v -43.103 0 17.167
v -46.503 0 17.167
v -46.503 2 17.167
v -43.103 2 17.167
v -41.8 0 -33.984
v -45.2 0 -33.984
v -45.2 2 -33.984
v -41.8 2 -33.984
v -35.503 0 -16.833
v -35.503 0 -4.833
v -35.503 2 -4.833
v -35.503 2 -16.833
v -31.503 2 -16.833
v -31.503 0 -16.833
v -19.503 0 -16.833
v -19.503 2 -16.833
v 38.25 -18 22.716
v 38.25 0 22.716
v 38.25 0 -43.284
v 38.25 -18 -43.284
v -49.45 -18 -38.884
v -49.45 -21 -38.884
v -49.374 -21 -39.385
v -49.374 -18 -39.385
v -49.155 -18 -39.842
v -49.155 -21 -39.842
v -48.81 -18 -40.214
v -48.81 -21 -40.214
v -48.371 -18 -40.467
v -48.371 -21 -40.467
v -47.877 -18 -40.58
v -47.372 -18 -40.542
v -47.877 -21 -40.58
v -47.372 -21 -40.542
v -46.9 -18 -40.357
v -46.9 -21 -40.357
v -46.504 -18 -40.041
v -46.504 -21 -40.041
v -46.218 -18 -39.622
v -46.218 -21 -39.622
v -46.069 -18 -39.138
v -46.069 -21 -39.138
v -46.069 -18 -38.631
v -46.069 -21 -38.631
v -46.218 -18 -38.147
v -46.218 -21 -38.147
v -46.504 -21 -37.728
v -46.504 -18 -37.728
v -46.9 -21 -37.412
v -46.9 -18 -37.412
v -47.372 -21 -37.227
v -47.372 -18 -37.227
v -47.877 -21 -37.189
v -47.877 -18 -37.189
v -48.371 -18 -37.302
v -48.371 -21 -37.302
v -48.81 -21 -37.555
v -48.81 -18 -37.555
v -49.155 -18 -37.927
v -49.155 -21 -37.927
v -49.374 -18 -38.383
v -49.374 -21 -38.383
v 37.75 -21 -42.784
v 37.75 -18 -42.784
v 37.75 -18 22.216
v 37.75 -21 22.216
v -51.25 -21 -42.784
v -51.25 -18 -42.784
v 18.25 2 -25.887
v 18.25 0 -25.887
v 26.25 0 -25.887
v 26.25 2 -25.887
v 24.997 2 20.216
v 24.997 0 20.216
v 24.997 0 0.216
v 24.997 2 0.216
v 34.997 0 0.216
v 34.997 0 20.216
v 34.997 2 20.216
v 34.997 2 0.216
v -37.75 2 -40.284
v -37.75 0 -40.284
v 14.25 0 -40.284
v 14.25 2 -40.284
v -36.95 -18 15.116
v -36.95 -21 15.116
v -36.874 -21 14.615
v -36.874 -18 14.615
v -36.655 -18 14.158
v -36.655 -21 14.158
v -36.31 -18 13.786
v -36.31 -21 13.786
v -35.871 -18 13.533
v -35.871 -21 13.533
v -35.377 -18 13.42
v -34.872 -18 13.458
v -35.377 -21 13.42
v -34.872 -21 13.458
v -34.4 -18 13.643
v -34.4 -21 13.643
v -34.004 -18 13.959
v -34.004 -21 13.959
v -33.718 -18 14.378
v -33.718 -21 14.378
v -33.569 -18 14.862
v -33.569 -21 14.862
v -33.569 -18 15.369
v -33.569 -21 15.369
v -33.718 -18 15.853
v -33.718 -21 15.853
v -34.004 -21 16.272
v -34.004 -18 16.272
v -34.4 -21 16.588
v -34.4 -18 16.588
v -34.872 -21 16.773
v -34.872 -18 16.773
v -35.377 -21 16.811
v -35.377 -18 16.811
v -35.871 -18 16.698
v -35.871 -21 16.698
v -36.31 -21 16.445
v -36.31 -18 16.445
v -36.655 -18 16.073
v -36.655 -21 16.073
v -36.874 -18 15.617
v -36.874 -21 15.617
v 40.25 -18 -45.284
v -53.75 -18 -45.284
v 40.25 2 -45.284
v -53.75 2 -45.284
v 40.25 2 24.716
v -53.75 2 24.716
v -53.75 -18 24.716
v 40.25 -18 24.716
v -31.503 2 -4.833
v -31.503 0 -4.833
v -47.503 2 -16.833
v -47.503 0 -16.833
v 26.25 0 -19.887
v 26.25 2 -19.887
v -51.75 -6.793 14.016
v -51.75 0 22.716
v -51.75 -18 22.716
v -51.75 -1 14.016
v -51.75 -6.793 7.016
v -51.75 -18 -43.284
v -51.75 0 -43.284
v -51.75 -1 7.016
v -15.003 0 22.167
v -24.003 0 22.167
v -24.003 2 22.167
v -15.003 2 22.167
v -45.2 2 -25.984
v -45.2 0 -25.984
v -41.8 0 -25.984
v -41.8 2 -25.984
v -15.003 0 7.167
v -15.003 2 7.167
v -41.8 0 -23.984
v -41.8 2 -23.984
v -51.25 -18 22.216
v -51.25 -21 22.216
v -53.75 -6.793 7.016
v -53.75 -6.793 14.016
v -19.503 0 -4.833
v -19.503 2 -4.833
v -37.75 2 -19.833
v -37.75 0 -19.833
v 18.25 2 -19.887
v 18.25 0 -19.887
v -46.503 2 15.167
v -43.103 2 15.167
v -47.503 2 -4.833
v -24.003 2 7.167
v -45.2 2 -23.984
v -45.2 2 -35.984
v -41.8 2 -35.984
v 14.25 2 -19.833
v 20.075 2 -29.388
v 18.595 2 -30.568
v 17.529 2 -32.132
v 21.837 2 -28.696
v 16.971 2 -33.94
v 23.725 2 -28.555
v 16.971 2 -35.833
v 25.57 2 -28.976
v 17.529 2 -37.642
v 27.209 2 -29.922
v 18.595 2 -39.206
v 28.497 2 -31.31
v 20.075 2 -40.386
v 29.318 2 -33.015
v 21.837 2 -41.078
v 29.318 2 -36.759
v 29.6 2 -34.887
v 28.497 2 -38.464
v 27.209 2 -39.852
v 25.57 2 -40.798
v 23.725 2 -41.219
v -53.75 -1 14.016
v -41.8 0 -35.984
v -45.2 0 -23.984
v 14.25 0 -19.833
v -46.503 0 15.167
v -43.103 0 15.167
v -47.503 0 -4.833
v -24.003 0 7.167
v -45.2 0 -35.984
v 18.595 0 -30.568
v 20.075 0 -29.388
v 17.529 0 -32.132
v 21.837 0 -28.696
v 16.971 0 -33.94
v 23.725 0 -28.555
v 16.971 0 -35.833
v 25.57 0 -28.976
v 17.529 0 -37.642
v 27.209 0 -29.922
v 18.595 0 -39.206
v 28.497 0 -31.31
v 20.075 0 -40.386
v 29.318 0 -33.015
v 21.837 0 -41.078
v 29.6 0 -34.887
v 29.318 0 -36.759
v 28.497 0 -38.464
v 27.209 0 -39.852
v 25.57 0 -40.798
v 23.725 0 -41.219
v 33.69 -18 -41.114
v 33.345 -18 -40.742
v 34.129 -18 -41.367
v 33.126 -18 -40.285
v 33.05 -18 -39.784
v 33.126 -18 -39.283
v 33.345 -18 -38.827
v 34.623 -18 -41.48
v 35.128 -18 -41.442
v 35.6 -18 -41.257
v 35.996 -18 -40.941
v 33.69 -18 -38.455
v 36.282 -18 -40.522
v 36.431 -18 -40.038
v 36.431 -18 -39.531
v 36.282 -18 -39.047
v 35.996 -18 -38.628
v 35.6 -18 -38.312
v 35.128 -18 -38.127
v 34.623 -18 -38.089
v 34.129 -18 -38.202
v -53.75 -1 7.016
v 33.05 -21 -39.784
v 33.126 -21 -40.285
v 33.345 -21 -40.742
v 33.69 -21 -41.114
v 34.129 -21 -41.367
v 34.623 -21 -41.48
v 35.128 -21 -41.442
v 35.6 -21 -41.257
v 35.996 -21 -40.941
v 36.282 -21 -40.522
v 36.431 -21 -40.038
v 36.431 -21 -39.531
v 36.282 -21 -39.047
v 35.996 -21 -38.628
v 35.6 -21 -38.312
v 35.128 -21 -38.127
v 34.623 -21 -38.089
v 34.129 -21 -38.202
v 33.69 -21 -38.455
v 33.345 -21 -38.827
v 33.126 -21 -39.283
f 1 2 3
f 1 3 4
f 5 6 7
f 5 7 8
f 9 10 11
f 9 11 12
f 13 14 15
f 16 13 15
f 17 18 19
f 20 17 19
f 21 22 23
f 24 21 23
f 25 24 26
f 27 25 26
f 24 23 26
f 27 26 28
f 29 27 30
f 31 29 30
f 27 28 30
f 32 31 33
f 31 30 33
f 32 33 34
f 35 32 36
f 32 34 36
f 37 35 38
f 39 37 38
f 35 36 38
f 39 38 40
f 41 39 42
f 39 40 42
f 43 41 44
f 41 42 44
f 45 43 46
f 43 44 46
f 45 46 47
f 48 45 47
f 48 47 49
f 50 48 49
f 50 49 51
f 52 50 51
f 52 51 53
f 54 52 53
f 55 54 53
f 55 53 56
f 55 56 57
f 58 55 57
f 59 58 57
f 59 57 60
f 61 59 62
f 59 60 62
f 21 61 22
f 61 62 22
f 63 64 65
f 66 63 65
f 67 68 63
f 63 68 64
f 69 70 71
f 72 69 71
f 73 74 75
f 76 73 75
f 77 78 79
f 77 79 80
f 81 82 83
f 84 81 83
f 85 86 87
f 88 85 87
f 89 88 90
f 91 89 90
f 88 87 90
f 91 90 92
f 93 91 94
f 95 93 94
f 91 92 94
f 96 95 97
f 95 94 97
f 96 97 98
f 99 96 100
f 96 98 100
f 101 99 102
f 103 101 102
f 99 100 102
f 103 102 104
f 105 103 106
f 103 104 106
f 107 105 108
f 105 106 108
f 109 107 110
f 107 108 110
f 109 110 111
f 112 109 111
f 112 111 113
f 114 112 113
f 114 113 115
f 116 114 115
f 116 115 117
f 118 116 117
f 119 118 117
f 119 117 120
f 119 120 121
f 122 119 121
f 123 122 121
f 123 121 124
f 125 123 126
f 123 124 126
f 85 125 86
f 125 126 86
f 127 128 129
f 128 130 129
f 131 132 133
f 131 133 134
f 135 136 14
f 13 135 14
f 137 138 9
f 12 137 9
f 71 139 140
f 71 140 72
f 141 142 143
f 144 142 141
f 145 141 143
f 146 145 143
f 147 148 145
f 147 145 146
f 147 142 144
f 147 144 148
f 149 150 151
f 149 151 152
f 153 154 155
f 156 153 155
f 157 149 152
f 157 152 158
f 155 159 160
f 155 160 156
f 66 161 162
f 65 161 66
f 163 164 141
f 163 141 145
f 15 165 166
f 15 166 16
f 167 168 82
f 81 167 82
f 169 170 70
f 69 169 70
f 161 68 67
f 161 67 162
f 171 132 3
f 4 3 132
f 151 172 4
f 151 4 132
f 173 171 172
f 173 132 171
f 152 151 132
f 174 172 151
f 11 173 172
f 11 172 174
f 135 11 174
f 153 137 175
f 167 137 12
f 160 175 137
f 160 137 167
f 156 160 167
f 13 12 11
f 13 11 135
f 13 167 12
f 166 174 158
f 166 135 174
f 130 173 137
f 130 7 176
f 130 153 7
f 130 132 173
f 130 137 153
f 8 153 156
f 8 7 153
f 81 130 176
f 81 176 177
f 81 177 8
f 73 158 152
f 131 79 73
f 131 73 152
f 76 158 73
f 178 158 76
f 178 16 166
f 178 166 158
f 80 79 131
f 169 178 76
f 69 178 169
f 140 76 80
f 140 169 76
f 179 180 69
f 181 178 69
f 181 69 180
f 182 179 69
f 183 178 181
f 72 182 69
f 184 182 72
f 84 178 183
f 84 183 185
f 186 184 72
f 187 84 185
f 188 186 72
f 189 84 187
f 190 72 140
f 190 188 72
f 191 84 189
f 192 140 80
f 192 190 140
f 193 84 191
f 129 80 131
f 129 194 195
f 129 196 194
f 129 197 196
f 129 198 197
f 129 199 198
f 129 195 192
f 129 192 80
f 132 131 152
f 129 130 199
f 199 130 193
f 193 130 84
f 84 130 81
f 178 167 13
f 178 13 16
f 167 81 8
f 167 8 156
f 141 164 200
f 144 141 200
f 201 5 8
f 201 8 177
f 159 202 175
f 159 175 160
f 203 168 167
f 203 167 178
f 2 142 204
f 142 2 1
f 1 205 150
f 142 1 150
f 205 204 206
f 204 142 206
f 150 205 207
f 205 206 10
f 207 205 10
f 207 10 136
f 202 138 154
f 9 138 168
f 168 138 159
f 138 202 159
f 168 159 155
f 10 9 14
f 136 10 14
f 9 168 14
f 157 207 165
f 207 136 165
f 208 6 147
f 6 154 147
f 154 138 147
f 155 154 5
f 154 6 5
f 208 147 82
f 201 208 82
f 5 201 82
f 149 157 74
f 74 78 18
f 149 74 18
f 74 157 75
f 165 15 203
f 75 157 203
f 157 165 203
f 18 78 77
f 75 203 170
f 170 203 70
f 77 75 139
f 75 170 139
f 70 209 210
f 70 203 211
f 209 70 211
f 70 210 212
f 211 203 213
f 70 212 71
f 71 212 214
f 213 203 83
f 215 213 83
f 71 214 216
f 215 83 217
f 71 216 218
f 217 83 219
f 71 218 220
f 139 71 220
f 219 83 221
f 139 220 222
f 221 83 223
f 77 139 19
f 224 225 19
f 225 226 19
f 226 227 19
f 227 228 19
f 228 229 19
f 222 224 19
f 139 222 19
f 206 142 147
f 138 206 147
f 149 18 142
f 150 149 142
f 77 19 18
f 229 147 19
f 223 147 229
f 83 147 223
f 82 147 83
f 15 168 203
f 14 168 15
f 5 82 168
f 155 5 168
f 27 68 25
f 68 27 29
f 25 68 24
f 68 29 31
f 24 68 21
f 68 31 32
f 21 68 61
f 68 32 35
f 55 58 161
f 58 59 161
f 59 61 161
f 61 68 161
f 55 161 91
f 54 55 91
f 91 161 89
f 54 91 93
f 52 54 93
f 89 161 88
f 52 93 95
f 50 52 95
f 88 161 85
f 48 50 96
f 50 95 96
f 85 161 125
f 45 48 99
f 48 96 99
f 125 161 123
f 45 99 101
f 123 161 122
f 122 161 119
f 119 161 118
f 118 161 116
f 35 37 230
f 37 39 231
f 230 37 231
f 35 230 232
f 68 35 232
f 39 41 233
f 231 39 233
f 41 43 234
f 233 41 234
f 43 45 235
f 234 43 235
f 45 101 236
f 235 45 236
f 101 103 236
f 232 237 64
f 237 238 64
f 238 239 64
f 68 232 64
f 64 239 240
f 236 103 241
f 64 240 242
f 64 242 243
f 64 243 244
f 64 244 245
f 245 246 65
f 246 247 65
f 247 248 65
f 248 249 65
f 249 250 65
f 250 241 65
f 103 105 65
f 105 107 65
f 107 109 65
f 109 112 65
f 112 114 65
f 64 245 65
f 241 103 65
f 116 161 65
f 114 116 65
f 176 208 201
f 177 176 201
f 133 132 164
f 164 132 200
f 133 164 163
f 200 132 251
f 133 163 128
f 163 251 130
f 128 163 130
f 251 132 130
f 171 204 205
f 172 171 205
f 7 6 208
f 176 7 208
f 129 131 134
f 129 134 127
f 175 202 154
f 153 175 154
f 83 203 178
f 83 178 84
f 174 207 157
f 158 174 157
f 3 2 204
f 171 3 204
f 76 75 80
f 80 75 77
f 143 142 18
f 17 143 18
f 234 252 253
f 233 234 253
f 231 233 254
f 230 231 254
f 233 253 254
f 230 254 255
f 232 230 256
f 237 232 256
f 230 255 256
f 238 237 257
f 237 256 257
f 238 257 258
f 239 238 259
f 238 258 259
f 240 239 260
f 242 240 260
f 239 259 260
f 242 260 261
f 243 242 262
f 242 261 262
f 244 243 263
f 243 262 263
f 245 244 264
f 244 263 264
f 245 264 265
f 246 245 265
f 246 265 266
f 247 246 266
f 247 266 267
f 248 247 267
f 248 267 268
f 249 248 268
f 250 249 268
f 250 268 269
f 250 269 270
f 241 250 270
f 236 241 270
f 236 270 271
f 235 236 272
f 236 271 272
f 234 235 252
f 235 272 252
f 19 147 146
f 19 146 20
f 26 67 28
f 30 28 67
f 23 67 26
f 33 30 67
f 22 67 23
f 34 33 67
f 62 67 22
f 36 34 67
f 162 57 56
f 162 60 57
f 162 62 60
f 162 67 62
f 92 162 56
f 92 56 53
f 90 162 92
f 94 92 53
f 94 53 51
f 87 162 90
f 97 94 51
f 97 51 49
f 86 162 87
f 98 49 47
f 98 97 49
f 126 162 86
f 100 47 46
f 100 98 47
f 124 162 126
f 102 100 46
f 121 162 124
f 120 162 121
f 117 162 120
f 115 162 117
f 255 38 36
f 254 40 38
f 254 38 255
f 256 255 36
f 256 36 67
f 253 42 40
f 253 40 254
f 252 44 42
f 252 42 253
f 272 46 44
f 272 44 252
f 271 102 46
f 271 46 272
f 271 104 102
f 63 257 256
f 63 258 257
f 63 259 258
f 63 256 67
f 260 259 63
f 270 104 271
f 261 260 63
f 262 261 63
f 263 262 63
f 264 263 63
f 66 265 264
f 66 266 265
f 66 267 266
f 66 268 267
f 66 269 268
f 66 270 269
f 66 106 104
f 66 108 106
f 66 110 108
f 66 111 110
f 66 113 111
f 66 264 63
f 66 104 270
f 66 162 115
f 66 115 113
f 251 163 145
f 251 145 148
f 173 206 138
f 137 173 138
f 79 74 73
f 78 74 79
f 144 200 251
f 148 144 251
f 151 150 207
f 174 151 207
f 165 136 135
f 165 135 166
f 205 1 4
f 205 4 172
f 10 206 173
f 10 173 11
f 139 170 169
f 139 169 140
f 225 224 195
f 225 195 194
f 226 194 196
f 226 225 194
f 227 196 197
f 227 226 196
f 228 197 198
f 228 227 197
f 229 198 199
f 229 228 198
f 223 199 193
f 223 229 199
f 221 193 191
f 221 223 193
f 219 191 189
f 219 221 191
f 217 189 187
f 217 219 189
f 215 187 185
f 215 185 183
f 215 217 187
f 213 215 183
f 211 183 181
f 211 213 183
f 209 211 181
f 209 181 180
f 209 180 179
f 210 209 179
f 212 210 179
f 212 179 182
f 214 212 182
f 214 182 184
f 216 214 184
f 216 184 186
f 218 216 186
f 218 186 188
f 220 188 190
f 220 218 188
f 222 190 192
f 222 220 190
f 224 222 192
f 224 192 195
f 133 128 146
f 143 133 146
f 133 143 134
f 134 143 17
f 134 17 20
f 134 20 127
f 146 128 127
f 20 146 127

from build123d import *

# Parameters (mm, degrees)
SKETCH1_W                = 94
SKETCH1_H                = 70
SKETCH1_R                = 6.35
SKETCH1_W_2              = 8
SKETCH1_H_2              = 6
SKETCH1_W_3              = 3.4
SKETCH1_H_3              = 2
SKETCH1_W_4              = 52
SKETCH1_H_4              = 20.451642238
SKETCH1_W_5              = 12
SKETCH1_H_5              = 12
SKETCH1_W_6              = 9
SKETCH1_H_6              = 15
SKETCH1_W_7              = 10
SKETCH1_H_7              = 20
BOSS_EXTRUDE1_DEPTH      = 2
SKETCH2_W                = 94
SKETCH2_H                = 70
SKETCH2_W_2              = 90
SKETCH2_H_2              = 66
BOSS_EXTRUDE2_DEPTH      = 1
BOSS_EXTRUDE2_DEPTH_BACK = 18
CUT_EXTRUDE1_START       = -94
SKETCH3_W                = 7
SKETCH3_H                = 5.793277682
CUT_EXTRUDE1_DEPTH       = 10
CUT_EXTRUDE1_DEPTH_BACK  = 10
SKETCH4_W                = 89
SKETCH4_H                = 65
BOSS_EXTRUDE3_DEPTH      = 3
SKETCH5_R                = 1.7
CUT_EXTRUDE5_DEPTH       = 3


with BuildPart() as part:
    # Sketch1 → Boss-Extrude1 (new body)
    with BuildSketch(Plane(origin=(0, 0, 0), x_dir=(1, 0, 0), z_dir=(0, 1, 0))):
        with Locations((-6.75, 10.284411869)):
            Rectangle(SKETCH1_W, SKETCH1_H)
        with Locations((23.25, 34.886908177)):
            Circle(SKETCH1_R, mode=Mode.SUBTRACT)
        with Locations((22.25, 22.886908177)):
            Rectangle(SKETCH1_W_2, SKETCH1_H_2, mode=Mode.SUBTRACT)
        with Locations((-43.5, 24.984411869)):
            Rectangle(SKETCH1_W_3, SKETCH1_H_3, mode=Mode.SUBTRACT)
        with Locations((-11.75, 30.05859075)):
            Rectangle(SKETCH1_W_4, SKETCH1_H_4, mode=Mode.SUBTRACT)
        with Locations((-41.502745427, 10.832769631)):
            Rectangle(SKETCH1_W_5, SKETCH1_H_5, mode=Mode.SUBTRACT)
        with Locations((-25.502745427, 10.832769631)):
            Rectangle(SKETCH1_W_5, SKETCH1_H_5, mode=Mode.SUBTRACT)
        with Locations((-43.5, 34.984411869)):
            Rectangle(SKETCH1_W_3, SKETCH1_H_3, mode=Mode.SUBTRACT)
        with Locations((-19.502745427, -14.667230369)):
            Rectangle(SKETCH1_W_6, SKETCH1_H_6, mode=Mode.SUBTRACT)
        with Locations((29.997254573, -10.215588131)):
            Rectangle(SKETCH1_W_7, SKETCH1_H_7, mode=Mode.SUBTRACT)
        with Locations((-44.802745427, -16.167230369)):
            Rectangle(SKETCH1_W_3, SKETCH1_H_3, mode=Mode.SUBTRACT)
    extrude(amount=BOSS_EXTRUDE1_DEPTH)

    # Sketch2 → Boss-Extrude2 (add, two sides)
    with BuildSketch(Plane(origin=(0, 0, 0), x_dir=(1, 0, 0), z_dir=(0, 1, 0))) as boss_extrude2_sk:
        with Locations((-6.75, 10.284411869)):
            Rectangle(SKETCH2_W, SKETCH2_H)
        with Locations((-6.75, 10.284411869)):
            Rectangle(SKETCH2_W_2, SKETCH2_H_2, mode=Mode.SUBTRACT)
    extrude(amount=BOSS_EXTRUDE2_DEPTH)
    extrude(boss_extrude2_sk.sketch, amount=-BOSS_EXTRUDE2_DEPTH_BACK)

    # Sketch3 → Cut-Extrude1 (cut, two sides)
    with BuildSketch(Plane(origin=(40.25, 0, 0), x_dir=(0, 0, -1), z_dir=(1, 0, 0)).offset(CUT_EXTRUDE1_START)) as cut_extrude1_sk:
        with Locations((-10.515588131, -3.896638841)):
            Rectangle(SKETCH3_W, SKETCH3_H)
    extrude(amount=CUT_EXTRUDE1_DEPTH, mode=Mode.SUBTRACT)
    extrude(cut_extrude1_sk.sketch, amount=-CUT_EXTRUDE1_DEPTH_BACK, mode=Mode.SUBTRACT)


with BuildPart() as body_2:
    # Sketch4 → Boss-Extrude3 (new body)
    with BuildSketch(Plane.XZ.offset(18)):
        with Locations((-6.75, -10.284411869)):
            Rectangle(SKETCH4_W, SKETCH4_H)
    extrude(amount=BOSS_EXTRUDE3_DEPTH)

    # Sketch5 → Cut-Extrude5 (cut)
    with BuildSketch(Plane(origin=(0, -21, 0), x_dir=(-1, 0, 0), z_dir=(0, -1, 0))):
        with Locations((-34.75, 39.784411869)):
            Circle(SKETCH5_R)
        with Locations((35.25, -15.115588131)):
            Circle(SKETCH5_R)
        with Locations((47.75, 38.884411869)):
            Circle(SKETCH5_R)
    extrude(amount=-CUT_EXTRUDE5_DEPTH, mode=Mode.SUBTRACT)


solid = Compound([part.part, body_2.part])
